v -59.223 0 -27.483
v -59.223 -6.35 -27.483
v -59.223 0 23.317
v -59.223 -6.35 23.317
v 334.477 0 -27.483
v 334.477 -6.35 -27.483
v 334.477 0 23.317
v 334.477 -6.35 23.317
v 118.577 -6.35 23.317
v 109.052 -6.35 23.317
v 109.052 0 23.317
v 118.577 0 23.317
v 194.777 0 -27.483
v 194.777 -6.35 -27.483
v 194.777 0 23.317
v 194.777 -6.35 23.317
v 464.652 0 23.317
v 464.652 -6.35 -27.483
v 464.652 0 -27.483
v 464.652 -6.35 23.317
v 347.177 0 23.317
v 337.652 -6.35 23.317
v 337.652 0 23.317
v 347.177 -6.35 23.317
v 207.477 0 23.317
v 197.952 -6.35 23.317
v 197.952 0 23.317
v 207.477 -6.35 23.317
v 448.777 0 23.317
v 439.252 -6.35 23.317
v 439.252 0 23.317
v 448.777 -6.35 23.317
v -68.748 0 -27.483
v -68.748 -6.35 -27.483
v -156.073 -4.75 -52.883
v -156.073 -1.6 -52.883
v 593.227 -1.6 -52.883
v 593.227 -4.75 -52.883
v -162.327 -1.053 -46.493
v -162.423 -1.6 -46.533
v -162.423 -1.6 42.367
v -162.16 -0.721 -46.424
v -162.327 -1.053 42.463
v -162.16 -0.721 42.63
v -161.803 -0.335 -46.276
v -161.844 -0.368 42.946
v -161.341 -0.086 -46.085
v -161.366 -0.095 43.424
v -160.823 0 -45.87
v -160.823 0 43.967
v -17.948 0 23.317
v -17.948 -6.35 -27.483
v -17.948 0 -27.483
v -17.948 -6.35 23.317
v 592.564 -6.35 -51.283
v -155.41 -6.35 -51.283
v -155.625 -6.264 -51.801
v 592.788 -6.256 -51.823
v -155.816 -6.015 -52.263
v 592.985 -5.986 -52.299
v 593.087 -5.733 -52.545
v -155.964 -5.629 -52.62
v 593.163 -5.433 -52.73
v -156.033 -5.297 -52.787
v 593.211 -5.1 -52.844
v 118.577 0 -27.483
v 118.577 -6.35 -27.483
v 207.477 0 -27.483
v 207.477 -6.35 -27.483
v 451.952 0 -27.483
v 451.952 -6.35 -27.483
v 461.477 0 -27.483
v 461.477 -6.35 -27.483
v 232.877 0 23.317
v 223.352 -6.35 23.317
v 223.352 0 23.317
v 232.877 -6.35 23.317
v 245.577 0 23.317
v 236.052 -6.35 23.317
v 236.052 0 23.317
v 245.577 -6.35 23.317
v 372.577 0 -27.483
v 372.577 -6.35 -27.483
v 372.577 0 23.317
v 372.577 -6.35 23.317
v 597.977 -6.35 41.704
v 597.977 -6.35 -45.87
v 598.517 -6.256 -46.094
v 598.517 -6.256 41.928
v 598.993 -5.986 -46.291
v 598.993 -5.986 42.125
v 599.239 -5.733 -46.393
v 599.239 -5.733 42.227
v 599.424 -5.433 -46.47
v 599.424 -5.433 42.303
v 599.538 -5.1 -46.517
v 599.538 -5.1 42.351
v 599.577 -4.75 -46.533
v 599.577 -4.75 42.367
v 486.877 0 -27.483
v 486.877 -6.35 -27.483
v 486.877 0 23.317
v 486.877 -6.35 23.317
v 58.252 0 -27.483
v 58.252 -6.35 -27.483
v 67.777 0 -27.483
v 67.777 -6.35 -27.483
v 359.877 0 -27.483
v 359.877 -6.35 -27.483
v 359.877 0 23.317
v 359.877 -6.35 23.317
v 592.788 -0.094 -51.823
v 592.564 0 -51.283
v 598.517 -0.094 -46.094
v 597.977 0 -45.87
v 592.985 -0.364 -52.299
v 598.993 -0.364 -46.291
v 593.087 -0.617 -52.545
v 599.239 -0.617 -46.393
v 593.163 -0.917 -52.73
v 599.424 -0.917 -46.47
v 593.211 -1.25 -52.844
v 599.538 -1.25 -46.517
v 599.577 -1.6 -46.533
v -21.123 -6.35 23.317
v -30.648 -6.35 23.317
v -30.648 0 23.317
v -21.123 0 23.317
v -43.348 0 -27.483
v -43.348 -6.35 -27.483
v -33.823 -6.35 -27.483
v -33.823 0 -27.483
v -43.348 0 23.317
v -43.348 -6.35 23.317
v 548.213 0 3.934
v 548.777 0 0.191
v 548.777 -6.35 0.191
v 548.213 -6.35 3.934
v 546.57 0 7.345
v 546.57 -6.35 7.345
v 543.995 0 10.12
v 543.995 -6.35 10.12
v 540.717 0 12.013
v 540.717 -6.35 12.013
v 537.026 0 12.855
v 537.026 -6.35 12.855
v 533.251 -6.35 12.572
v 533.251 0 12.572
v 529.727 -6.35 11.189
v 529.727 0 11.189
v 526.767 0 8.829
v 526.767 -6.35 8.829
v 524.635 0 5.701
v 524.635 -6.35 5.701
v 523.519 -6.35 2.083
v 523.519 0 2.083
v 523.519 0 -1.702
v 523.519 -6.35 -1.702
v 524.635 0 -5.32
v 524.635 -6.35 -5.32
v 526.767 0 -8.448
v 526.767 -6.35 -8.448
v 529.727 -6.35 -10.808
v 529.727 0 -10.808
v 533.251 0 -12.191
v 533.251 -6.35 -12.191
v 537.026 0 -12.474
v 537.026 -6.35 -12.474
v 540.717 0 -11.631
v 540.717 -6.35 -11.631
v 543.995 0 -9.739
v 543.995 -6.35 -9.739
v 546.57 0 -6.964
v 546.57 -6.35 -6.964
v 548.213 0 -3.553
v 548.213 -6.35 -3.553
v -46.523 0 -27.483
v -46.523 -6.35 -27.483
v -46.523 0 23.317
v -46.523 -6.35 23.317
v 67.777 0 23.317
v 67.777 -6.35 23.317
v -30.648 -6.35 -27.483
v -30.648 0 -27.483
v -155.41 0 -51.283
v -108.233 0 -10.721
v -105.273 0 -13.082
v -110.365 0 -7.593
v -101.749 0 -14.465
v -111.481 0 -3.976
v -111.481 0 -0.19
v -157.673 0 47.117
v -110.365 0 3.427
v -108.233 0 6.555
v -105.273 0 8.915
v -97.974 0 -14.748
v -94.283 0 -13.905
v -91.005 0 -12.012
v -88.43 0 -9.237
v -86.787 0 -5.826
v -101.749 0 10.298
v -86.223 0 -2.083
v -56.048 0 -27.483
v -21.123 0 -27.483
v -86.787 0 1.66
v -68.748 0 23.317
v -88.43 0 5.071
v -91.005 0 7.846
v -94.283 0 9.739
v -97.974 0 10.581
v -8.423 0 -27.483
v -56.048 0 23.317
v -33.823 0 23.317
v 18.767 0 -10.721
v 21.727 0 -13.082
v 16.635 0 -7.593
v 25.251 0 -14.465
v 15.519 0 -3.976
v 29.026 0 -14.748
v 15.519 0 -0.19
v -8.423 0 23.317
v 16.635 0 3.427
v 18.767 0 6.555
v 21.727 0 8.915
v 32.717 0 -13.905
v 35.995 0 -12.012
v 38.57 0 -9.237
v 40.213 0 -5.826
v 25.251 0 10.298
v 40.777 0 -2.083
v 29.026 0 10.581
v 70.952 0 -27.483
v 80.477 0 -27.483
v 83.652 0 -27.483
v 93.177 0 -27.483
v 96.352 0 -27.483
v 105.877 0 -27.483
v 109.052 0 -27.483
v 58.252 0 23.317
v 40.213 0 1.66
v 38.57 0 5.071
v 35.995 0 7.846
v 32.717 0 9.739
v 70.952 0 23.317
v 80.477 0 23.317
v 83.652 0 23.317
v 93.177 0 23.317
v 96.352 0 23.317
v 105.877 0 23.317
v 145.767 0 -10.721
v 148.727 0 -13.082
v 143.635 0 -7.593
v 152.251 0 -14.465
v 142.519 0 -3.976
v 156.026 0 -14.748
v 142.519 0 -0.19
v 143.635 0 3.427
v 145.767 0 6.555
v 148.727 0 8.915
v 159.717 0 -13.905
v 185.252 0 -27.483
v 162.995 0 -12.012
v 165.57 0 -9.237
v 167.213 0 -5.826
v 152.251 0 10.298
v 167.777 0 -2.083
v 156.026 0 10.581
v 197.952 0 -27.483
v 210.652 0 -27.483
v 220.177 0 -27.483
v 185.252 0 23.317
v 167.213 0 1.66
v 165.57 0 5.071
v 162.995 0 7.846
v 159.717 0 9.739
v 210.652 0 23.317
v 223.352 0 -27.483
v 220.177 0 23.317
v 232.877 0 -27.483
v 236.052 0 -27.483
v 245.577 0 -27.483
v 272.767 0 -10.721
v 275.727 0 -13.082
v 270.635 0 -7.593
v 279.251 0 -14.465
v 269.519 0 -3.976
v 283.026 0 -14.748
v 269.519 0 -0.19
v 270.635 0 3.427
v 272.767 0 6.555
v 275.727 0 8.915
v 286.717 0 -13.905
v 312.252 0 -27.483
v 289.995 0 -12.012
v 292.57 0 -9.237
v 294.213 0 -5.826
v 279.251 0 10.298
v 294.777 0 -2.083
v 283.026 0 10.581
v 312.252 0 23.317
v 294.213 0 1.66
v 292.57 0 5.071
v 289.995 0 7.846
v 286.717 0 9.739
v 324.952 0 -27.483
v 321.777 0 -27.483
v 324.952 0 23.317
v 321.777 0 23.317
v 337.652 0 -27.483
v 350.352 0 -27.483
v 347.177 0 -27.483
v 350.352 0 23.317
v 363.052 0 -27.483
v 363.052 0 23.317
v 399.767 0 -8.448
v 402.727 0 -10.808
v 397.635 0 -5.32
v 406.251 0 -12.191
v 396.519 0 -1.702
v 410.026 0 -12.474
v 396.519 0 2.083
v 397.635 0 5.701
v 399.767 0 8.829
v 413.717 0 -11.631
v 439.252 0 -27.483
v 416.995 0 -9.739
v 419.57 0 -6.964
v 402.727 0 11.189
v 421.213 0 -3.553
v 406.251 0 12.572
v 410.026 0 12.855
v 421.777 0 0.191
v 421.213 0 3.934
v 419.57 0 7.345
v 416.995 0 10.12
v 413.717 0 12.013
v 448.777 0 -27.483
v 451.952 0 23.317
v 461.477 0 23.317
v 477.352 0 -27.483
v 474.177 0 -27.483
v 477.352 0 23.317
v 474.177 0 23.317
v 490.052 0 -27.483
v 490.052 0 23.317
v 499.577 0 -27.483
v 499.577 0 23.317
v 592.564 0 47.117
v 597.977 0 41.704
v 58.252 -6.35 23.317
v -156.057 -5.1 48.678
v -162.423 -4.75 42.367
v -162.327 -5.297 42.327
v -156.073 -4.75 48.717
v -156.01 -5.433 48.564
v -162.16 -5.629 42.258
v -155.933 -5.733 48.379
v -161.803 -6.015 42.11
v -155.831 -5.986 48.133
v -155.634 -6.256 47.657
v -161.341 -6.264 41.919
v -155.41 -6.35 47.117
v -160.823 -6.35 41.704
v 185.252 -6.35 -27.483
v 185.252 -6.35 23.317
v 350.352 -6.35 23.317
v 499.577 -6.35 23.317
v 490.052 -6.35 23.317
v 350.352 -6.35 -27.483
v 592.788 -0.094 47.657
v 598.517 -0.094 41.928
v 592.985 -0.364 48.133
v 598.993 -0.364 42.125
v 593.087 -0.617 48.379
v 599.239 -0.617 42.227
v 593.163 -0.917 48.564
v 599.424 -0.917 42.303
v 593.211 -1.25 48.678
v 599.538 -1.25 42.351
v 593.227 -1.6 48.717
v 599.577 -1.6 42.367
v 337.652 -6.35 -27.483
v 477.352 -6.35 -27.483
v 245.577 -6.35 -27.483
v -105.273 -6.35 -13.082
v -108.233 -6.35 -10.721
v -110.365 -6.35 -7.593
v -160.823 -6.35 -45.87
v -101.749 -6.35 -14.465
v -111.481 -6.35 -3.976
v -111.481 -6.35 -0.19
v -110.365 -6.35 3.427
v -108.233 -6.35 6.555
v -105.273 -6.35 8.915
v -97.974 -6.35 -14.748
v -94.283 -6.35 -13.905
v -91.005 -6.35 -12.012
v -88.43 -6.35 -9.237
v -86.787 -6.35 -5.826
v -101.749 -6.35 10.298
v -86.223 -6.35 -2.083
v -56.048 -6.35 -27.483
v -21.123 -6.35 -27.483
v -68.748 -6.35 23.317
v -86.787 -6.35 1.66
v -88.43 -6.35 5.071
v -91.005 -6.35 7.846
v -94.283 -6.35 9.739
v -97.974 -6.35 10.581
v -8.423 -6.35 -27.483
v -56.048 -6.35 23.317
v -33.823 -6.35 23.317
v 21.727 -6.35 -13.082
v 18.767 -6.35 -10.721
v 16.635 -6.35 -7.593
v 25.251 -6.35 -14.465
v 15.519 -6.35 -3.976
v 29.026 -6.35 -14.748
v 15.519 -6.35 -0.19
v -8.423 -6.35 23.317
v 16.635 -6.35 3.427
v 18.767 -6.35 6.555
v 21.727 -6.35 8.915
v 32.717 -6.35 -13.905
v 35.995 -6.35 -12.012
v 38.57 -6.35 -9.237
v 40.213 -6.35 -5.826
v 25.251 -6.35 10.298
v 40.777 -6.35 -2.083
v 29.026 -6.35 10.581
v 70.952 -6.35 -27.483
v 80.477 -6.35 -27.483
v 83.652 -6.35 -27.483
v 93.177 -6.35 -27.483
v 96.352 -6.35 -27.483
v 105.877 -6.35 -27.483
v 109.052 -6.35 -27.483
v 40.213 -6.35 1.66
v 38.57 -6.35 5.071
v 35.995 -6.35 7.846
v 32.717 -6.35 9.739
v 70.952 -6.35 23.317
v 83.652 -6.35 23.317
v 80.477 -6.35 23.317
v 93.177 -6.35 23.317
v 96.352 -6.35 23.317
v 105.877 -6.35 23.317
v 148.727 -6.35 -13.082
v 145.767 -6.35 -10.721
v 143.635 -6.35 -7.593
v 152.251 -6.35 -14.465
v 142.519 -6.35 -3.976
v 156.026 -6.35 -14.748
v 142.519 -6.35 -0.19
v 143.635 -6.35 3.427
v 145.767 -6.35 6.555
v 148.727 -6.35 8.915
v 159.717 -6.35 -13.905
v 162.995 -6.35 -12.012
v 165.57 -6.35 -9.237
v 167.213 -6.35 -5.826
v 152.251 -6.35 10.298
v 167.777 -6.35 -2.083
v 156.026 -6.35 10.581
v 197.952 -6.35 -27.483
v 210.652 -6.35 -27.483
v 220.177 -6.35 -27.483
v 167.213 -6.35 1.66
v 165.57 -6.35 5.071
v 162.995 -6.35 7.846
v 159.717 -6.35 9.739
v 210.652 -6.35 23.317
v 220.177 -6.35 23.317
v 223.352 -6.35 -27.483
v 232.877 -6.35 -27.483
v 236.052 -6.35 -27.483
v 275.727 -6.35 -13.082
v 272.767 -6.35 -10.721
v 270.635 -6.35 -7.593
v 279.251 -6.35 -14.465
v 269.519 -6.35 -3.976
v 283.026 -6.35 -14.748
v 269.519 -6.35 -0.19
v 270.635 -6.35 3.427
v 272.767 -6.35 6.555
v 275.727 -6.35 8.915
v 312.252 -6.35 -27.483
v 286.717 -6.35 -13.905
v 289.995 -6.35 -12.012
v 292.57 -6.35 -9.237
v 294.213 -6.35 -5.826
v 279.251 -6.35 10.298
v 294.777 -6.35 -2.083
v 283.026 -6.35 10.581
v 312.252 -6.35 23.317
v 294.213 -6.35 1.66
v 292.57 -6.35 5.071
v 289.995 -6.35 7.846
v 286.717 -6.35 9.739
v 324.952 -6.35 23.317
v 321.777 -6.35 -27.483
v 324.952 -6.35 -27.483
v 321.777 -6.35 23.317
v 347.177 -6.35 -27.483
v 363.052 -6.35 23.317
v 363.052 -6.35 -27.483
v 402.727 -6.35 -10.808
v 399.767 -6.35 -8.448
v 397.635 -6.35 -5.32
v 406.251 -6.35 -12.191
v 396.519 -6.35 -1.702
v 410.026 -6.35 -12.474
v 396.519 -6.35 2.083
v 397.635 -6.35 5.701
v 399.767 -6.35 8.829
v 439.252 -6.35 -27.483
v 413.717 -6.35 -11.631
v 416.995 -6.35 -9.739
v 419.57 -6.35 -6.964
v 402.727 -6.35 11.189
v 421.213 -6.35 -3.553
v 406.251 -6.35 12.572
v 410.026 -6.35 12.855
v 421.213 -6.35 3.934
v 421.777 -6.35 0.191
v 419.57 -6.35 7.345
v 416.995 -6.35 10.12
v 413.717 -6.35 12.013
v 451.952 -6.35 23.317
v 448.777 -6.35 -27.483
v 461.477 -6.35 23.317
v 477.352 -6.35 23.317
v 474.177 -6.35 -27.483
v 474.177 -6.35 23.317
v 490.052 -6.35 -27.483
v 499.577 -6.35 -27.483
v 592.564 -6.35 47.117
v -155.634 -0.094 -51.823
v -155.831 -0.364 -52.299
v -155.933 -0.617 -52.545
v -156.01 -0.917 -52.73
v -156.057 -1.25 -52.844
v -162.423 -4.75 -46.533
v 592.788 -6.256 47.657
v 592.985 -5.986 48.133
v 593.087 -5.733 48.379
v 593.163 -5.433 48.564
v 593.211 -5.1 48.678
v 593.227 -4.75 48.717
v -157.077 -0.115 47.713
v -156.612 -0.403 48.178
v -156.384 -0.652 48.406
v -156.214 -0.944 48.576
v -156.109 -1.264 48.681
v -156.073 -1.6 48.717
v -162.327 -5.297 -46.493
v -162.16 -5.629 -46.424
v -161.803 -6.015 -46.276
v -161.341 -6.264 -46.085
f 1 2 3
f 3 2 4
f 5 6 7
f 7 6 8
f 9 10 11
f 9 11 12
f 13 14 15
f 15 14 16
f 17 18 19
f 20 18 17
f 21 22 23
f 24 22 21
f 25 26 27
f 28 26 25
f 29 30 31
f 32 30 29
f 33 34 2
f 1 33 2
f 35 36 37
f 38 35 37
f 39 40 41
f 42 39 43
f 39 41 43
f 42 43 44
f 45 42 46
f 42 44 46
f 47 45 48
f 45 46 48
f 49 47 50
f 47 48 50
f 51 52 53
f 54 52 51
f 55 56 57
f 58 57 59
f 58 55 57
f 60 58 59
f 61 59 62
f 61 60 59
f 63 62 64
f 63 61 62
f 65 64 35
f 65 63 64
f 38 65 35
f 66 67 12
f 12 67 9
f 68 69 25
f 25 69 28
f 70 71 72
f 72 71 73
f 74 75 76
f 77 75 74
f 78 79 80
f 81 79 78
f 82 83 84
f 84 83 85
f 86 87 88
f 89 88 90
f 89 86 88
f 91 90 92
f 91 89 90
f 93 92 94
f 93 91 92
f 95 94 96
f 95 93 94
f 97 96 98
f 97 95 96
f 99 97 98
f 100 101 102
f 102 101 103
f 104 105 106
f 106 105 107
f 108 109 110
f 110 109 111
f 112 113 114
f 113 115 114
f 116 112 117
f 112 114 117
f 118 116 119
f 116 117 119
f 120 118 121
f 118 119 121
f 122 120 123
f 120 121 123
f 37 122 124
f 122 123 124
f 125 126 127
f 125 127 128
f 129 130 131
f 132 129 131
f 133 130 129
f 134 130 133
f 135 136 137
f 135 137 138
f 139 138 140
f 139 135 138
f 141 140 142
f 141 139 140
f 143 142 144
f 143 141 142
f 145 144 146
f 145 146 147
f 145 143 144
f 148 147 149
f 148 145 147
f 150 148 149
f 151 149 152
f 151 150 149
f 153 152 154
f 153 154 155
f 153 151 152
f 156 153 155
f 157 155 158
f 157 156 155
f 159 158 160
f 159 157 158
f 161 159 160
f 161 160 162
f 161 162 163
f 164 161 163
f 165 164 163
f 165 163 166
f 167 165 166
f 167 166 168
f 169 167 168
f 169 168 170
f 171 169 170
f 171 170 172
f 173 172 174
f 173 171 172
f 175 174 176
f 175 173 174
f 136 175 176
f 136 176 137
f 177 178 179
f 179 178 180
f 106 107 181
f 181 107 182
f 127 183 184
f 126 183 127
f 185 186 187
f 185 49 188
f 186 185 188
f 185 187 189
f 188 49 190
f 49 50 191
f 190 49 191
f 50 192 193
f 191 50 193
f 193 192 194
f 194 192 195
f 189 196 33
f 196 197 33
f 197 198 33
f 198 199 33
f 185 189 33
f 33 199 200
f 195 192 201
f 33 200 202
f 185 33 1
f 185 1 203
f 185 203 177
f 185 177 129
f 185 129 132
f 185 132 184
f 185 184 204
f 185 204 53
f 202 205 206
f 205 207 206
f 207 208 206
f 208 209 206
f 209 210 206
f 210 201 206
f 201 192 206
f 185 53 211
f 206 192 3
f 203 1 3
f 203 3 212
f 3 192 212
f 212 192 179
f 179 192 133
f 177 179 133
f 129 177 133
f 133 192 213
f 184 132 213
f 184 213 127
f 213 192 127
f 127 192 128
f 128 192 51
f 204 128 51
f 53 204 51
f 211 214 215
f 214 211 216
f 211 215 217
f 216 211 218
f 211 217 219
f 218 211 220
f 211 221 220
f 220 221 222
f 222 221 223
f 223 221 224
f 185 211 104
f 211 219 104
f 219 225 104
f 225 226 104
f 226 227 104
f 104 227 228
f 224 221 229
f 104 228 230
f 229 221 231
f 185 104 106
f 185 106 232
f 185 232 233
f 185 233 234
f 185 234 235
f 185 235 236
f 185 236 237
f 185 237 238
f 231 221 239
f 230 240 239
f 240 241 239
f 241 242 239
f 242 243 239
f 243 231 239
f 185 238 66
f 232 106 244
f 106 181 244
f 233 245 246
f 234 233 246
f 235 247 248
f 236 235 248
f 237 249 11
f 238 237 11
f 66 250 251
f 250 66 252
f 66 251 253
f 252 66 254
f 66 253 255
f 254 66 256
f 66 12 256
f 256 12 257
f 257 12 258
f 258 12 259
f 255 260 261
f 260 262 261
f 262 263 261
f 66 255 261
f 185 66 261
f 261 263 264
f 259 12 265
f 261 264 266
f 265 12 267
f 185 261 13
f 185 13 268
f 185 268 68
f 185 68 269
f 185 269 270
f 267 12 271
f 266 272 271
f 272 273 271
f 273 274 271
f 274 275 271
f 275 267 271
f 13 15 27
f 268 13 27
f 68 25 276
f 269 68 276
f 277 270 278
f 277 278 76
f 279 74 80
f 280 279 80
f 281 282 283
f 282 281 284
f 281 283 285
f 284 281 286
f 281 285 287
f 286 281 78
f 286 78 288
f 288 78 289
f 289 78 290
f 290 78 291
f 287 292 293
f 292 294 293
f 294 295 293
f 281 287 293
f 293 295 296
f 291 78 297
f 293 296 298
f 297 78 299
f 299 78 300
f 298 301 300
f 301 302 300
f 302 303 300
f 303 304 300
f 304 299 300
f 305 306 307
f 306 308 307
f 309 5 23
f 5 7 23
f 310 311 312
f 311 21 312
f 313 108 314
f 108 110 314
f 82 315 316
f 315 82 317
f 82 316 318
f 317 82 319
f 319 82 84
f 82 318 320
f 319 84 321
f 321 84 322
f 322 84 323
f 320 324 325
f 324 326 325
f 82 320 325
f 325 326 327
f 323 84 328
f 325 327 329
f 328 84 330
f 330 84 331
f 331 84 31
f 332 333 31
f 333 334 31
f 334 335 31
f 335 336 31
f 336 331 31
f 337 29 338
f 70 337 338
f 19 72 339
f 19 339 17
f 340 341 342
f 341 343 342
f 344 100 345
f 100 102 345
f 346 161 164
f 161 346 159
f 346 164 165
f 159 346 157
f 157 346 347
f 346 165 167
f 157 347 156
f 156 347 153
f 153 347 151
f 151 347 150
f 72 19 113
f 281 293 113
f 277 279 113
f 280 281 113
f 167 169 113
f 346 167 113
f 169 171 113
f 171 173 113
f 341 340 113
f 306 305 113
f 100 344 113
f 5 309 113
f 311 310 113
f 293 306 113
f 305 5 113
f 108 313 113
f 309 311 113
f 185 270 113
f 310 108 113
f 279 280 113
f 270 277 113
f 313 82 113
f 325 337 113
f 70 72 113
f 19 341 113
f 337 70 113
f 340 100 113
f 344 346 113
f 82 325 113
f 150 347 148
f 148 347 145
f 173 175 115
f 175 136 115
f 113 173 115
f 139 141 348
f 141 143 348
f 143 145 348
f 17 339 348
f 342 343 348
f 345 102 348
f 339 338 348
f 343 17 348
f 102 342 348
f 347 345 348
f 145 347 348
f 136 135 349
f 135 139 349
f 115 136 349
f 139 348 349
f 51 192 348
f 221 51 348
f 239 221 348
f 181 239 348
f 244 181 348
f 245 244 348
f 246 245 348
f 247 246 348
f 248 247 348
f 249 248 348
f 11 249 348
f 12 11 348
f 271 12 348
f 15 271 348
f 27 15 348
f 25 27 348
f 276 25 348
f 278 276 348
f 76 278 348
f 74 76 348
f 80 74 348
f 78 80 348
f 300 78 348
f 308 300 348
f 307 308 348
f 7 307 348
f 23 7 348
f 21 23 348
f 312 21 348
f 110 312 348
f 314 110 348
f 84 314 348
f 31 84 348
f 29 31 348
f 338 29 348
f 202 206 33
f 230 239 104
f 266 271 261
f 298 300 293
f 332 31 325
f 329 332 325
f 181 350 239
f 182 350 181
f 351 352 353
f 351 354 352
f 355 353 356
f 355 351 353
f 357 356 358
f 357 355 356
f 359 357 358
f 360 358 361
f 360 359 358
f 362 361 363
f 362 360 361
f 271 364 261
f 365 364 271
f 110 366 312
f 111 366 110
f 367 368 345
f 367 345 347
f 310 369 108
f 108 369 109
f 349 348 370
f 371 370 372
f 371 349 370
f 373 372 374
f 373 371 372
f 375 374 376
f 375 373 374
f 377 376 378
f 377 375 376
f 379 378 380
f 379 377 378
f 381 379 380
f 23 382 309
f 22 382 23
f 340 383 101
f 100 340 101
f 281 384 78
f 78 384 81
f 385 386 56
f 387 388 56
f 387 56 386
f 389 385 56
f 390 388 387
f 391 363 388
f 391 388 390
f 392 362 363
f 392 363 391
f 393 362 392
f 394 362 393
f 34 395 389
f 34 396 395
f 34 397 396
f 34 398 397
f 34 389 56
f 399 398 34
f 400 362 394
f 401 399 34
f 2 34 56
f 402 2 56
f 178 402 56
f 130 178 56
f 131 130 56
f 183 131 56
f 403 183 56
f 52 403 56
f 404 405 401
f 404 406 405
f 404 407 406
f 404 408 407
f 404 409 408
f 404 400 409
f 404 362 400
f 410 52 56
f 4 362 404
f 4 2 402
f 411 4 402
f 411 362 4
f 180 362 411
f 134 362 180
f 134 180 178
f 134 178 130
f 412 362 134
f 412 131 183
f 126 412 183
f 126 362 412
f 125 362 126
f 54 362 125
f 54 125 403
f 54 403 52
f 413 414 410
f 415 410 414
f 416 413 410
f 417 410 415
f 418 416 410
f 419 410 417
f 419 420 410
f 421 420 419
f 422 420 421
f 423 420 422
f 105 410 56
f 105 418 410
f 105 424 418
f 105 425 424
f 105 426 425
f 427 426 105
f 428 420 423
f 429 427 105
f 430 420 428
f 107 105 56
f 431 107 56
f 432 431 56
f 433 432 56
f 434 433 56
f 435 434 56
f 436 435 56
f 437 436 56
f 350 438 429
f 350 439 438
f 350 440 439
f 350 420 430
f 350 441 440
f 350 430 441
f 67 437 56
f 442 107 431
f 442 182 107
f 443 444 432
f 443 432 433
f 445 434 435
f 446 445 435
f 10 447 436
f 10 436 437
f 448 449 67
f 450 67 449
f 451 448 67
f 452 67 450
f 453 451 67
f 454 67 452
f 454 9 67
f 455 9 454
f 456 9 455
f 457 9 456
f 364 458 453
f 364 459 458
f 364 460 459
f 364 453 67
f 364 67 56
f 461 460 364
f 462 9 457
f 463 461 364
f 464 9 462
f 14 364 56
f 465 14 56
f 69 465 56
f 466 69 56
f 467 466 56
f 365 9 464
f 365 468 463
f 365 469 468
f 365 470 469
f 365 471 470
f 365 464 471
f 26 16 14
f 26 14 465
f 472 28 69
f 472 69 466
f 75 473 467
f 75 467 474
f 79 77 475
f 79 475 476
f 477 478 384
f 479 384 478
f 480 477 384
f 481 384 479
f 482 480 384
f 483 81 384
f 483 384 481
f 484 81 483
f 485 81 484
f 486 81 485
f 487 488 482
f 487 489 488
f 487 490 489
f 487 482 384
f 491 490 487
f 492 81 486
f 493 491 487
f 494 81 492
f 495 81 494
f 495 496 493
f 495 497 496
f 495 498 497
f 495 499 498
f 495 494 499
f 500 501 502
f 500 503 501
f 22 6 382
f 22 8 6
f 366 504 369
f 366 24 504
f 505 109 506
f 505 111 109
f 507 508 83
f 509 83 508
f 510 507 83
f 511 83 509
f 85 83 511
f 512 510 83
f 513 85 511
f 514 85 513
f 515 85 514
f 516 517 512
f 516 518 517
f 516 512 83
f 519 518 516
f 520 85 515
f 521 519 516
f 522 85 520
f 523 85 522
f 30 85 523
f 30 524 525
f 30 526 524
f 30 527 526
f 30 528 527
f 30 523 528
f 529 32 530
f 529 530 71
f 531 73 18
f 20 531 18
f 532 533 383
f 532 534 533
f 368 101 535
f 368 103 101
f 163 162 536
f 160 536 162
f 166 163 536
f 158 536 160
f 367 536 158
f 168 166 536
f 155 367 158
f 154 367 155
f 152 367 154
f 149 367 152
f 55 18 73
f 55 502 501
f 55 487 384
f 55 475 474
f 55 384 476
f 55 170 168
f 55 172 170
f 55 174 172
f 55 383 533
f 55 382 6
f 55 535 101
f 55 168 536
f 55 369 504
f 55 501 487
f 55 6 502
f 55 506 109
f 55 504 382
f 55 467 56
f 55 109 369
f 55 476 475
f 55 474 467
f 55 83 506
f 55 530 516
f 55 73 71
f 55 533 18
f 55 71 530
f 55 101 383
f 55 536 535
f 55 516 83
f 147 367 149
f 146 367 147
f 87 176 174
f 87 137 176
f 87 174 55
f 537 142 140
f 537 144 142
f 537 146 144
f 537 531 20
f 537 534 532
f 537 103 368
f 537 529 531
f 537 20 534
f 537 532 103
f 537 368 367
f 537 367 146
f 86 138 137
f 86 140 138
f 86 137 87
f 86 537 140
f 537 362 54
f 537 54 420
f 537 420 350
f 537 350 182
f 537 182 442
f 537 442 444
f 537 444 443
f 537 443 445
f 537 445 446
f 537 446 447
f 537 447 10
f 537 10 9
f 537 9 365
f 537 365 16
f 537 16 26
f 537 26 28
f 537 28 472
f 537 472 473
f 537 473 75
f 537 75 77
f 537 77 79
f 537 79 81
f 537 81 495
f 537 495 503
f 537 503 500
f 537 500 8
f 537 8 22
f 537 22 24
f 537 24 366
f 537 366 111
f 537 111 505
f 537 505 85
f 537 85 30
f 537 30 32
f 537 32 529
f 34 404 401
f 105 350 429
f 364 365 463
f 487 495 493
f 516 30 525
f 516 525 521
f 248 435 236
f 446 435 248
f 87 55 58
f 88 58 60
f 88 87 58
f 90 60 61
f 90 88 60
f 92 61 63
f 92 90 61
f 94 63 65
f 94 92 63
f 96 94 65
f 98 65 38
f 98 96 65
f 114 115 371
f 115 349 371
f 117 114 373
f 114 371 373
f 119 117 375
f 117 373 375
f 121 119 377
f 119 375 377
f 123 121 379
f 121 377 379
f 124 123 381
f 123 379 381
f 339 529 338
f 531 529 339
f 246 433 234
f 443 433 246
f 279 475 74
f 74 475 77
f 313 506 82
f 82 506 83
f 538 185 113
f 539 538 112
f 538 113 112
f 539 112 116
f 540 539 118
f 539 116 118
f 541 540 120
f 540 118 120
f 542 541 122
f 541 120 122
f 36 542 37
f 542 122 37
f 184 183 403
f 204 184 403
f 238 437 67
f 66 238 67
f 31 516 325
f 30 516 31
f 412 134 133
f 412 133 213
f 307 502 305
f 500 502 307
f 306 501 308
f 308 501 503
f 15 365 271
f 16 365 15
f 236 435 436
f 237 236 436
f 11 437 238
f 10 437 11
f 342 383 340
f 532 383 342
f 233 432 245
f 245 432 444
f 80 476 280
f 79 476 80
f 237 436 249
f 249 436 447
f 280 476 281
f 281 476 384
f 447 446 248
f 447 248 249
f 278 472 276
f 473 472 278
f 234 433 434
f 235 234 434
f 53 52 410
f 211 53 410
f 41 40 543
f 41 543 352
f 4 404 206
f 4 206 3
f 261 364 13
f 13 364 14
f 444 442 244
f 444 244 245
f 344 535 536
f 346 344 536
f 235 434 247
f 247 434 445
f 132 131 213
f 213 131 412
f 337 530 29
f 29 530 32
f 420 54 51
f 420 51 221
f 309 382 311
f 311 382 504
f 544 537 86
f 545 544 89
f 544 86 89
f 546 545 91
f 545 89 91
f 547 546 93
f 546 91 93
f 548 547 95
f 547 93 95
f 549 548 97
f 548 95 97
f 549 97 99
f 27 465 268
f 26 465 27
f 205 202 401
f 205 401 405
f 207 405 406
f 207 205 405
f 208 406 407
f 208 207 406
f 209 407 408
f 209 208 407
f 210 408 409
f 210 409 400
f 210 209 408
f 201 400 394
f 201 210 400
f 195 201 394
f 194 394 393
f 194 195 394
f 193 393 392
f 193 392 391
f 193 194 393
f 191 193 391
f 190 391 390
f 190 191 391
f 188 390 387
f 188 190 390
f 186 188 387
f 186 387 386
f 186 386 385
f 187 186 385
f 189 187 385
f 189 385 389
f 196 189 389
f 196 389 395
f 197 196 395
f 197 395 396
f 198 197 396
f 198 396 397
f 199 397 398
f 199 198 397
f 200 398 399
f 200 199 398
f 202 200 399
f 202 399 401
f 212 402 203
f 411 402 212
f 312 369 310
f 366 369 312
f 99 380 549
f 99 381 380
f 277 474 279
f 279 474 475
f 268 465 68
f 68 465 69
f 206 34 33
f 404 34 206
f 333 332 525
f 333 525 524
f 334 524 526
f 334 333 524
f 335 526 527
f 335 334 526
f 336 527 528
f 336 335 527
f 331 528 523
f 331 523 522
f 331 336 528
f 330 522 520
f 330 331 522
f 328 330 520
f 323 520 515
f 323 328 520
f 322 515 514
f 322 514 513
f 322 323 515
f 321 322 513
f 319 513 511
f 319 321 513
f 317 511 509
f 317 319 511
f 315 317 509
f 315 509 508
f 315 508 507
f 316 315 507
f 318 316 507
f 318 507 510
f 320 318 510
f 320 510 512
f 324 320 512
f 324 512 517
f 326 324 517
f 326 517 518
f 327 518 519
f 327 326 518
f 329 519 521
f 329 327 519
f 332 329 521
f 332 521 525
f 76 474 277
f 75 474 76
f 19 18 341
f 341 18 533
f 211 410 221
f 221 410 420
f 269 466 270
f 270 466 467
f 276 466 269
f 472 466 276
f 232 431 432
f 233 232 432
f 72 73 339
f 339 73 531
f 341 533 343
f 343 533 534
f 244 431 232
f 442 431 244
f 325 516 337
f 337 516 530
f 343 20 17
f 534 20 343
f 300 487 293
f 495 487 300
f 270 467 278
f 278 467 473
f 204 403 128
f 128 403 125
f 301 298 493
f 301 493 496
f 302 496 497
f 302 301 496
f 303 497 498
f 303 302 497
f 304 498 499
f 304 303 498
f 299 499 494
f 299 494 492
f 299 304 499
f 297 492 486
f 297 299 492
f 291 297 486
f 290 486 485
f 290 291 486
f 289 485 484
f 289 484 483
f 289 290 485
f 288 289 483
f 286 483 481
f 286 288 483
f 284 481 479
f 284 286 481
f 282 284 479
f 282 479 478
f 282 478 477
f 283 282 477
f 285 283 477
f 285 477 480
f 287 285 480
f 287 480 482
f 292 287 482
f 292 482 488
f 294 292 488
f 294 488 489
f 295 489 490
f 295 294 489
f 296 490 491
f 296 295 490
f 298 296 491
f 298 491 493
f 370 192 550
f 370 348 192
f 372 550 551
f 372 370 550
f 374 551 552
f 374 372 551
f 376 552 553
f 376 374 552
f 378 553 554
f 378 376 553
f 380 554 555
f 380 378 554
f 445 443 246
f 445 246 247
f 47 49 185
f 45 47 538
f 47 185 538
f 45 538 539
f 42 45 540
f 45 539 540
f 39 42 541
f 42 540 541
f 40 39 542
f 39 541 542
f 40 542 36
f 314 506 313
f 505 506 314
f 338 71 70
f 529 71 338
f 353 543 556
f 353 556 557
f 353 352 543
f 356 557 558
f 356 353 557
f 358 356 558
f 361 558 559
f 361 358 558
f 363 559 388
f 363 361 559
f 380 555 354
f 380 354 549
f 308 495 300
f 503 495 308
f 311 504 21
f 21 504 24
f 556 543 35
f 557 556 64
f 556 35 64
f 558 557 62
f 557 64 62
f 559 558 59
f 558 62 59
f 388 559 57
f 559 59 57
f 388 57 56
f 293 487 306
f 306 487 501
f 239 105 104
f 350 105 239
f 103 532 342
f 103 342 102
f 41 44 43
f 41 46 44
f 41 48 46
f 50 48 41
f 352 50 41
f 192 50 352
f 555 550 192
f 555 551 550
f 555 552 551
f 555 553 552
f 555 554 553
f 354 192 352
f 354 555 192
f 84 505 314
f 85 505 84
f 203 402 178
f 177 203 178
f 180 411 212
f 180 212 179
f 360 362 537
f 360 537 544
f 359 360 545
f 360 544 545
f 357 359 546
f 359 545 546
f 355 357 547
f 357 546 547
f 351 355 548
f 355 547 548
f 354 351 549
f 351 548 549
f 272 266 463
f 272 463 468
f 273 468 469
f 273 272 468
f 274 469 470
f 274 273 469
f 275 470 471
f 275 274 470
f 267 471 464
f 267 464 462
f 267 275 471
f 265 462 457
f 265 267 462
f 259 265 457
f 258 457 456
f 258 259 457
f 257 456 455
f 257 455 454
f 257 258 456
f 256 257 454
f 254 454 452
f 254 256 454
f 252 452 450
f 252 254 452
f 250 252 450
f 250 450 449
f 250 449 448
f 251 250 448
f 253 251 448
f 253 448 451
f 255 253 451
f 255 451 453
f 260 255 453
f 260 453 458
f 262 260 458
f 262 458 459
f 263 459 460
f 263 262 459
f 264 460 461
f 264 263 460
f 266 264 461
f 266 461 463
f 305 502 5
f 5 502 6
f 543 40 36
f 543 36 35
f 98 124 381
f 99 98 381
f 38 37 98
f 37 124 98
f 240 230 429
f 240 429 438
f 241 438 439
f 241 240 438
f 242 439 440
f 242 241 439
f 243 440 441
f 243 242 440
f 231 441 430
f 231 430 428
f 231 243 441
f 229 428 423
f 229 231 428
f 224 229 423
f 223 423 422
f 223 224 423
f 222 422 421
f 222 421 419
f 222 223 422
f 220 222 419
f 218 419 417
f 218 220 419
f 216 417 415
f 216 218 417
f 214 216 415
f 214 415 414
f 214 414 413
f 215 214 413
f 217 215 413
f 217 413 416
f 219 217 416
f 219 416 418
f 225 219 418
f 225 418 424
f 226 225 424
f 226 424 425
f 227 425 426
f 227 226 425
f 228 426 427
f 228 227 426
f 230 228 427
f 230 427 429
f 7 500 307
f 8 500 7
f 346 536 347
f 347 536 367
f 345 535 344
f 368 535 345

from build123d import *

# Parameters (mm, degrees)
F0_W     = 762
F0_H     = 101.6
F0_R     = 12.7
F2_DEPTH = 6.35
F3_SIZE  = 6.35
F4_W     = 9.525
F4_H     = 50.8
F5_DEPTH = 6.351
F6_R     = 1.6002


with BuildPart() as f2:
    # F0 (on Front) → F2 (new body)
    with BuildSketch(Plane.XZ):
        with Locations((218.576816025, -2.0831003785)):
            Rectangle(F0_W, F0_H)
        with Locations((-98.923183975, -2.0831003785)):
            Circle(F0_R, mode=Mode.SUBTRACT)
        with Locations((28.076816025, -2.0831003785)):
            Circle(F0_R, mode=Mode.SUBTRACT)
        with Locations((155.076816025, -2.0831003785)):
            Circle(F0_R, mode=Mode.SUBTRACT)
        with Locations((282.076816025, -2.0831003785)):
            Circle(F0_R, mode=Mode.SUBTRACT)
        with Locations((409.076816025, 0.1906121615)):
            Circle(F0_R, mode=Mode.SUBTRACT)
        with Locations((536.076816025, 0.1906121615)):
            Circle(F0_R, mode=Mode.SUBTRACT)
    extrude(amount=F2_DEPTH)

    # F3
    f3_edges = [f2.edges().sort_by_distance(p)[0] for p in [
        (-162.423184, -3.175, 48.7169),
        (-162.423184, -3.175, -52.8831),
        (599.576816, -3.175, -52.8831),
        (599.576816, -3.175, 48.7169),
    ]]
    chamfer(f3_edges, length=F3_SIZE)

    # F4 (on face) → F5 (cut, through all)
    with BuildSketch(Plane.XZ.offset(6.35)):
        with Locations((-63.985483975, -2.0831003785)):
            Rectangle(F4_W, F4_H)
        with Locations((-51.285483975, -2.0831003785)):
            Rectangle(F4_W, F4_H)
        with Locations((-38.585483975, -2.0831003785)):
            Rectangle(F4_W, F4_H)
        with Locations((-25.885483975, -2.0831003785)):
            Rectangle(F4_W, F4_H)
        with Locations((-13.185483975, -2.0831003785)):
            Rectangle(F4_W, F4_H)
        with Locations((63.014516025, -2.0831003785)):
            Rectangle(F4_W, F4_H)
        with Locations((75.714516025, -2.0831003785)):
            Rectangle(F4_W, F4_H)
        with Locations((88.414516025, -2.0831003785)):
            Rectangle(F4_W, F4_H)
        with Locations((101.114516025, -2.0831003785)):
            Rectangle(F4_W, F4_H)
        with Locations((113.814516025, -2.0831003785)):
            Rectangle(F4_W, F4_H)
        with Locations((190.014516025, -2.0831003785)):
            Rectangle(F4_W, F4_H)
        with Locations((202.714516025, -2.0831003785)):
            Rectangle(F4_W, F4_H)
        with Locations((215.414516025, -2.0831003785)):
            Rectangle(F4_W, F4_H)
        with Locations((228.114516025, -2.0831003785)):
            Rectangle(F4_W, F4_H)
        with Locations((240.814516025, -2.0831003785)):
            Rectangle(F4_W, F4_H)
        with Locations((317.014516025, -2.0831003785)):
            Rectangle(F4_W, F4_H)
        with Locations((329.714516025, -2.0831003785)):
            Rectangle(F4_W, F4_H)
        with Locations((342.414516025, -2.0831003785)):
            Rectangle(F4_W, F4_H)
        with Locations((355.114516025, -2.0831003785)):
            Rectangle(F4_W, F4_H)
        with Locations((367.814516025, -2.0831003785)):
            Rectangle(F4_W, F4_H)
        with Locations((444.014516025, -2.0831003785)):
            Rectangle(F4_W, F4_H)
        with Locations((456.714516025, -2.0831003785)):
            Rectangle(F4_W, F4_H)
        with Locations((469.414516025, -2.0831003785)):
            Rectangle(F4_W, F4_H)
        with Locations((482.114516025, -2.0831003785)):
            Rectangle(F4_W, F4_H)
        with Locations((494.814516025, -2.0831003785)):
            Rectangle(F4_W, F4_H)
    extrude(amount=-F5_DEPTH, mode=Mode.SUBTRACT)

    # F6
    f6_edges = [f2.edges().sort_by_distance(p)[0] for p in [
        (218.576816, -6.35, 48.7169),
        (-162.423184, 0, -2.0831),
        (-159.248184, -6.35, 45.5419),
        (-162.423184, -6.35, -2.0831),
        (-159.248184, -6.35, -49.7081),
        (218.576816, -6.35, -52.8831),
        (596.401816, -6.35, -49.7081),
        (599.576816, -6.35, -2.0831),
        (596.401816, -6.35, 45.5419),
        (596.401816, 0, 45.5419),
        (218.576816, 0, 48.7169),
        (599.576816, 0, -2.0831),
        (596.401816, 0, -49.7081),
        (218.576816, 0, -52.8831),
        (-159.248184, 0, -49.7081),
    ]]
    fillet(f6_edges, radius=F6_R)


solid = f2.part
